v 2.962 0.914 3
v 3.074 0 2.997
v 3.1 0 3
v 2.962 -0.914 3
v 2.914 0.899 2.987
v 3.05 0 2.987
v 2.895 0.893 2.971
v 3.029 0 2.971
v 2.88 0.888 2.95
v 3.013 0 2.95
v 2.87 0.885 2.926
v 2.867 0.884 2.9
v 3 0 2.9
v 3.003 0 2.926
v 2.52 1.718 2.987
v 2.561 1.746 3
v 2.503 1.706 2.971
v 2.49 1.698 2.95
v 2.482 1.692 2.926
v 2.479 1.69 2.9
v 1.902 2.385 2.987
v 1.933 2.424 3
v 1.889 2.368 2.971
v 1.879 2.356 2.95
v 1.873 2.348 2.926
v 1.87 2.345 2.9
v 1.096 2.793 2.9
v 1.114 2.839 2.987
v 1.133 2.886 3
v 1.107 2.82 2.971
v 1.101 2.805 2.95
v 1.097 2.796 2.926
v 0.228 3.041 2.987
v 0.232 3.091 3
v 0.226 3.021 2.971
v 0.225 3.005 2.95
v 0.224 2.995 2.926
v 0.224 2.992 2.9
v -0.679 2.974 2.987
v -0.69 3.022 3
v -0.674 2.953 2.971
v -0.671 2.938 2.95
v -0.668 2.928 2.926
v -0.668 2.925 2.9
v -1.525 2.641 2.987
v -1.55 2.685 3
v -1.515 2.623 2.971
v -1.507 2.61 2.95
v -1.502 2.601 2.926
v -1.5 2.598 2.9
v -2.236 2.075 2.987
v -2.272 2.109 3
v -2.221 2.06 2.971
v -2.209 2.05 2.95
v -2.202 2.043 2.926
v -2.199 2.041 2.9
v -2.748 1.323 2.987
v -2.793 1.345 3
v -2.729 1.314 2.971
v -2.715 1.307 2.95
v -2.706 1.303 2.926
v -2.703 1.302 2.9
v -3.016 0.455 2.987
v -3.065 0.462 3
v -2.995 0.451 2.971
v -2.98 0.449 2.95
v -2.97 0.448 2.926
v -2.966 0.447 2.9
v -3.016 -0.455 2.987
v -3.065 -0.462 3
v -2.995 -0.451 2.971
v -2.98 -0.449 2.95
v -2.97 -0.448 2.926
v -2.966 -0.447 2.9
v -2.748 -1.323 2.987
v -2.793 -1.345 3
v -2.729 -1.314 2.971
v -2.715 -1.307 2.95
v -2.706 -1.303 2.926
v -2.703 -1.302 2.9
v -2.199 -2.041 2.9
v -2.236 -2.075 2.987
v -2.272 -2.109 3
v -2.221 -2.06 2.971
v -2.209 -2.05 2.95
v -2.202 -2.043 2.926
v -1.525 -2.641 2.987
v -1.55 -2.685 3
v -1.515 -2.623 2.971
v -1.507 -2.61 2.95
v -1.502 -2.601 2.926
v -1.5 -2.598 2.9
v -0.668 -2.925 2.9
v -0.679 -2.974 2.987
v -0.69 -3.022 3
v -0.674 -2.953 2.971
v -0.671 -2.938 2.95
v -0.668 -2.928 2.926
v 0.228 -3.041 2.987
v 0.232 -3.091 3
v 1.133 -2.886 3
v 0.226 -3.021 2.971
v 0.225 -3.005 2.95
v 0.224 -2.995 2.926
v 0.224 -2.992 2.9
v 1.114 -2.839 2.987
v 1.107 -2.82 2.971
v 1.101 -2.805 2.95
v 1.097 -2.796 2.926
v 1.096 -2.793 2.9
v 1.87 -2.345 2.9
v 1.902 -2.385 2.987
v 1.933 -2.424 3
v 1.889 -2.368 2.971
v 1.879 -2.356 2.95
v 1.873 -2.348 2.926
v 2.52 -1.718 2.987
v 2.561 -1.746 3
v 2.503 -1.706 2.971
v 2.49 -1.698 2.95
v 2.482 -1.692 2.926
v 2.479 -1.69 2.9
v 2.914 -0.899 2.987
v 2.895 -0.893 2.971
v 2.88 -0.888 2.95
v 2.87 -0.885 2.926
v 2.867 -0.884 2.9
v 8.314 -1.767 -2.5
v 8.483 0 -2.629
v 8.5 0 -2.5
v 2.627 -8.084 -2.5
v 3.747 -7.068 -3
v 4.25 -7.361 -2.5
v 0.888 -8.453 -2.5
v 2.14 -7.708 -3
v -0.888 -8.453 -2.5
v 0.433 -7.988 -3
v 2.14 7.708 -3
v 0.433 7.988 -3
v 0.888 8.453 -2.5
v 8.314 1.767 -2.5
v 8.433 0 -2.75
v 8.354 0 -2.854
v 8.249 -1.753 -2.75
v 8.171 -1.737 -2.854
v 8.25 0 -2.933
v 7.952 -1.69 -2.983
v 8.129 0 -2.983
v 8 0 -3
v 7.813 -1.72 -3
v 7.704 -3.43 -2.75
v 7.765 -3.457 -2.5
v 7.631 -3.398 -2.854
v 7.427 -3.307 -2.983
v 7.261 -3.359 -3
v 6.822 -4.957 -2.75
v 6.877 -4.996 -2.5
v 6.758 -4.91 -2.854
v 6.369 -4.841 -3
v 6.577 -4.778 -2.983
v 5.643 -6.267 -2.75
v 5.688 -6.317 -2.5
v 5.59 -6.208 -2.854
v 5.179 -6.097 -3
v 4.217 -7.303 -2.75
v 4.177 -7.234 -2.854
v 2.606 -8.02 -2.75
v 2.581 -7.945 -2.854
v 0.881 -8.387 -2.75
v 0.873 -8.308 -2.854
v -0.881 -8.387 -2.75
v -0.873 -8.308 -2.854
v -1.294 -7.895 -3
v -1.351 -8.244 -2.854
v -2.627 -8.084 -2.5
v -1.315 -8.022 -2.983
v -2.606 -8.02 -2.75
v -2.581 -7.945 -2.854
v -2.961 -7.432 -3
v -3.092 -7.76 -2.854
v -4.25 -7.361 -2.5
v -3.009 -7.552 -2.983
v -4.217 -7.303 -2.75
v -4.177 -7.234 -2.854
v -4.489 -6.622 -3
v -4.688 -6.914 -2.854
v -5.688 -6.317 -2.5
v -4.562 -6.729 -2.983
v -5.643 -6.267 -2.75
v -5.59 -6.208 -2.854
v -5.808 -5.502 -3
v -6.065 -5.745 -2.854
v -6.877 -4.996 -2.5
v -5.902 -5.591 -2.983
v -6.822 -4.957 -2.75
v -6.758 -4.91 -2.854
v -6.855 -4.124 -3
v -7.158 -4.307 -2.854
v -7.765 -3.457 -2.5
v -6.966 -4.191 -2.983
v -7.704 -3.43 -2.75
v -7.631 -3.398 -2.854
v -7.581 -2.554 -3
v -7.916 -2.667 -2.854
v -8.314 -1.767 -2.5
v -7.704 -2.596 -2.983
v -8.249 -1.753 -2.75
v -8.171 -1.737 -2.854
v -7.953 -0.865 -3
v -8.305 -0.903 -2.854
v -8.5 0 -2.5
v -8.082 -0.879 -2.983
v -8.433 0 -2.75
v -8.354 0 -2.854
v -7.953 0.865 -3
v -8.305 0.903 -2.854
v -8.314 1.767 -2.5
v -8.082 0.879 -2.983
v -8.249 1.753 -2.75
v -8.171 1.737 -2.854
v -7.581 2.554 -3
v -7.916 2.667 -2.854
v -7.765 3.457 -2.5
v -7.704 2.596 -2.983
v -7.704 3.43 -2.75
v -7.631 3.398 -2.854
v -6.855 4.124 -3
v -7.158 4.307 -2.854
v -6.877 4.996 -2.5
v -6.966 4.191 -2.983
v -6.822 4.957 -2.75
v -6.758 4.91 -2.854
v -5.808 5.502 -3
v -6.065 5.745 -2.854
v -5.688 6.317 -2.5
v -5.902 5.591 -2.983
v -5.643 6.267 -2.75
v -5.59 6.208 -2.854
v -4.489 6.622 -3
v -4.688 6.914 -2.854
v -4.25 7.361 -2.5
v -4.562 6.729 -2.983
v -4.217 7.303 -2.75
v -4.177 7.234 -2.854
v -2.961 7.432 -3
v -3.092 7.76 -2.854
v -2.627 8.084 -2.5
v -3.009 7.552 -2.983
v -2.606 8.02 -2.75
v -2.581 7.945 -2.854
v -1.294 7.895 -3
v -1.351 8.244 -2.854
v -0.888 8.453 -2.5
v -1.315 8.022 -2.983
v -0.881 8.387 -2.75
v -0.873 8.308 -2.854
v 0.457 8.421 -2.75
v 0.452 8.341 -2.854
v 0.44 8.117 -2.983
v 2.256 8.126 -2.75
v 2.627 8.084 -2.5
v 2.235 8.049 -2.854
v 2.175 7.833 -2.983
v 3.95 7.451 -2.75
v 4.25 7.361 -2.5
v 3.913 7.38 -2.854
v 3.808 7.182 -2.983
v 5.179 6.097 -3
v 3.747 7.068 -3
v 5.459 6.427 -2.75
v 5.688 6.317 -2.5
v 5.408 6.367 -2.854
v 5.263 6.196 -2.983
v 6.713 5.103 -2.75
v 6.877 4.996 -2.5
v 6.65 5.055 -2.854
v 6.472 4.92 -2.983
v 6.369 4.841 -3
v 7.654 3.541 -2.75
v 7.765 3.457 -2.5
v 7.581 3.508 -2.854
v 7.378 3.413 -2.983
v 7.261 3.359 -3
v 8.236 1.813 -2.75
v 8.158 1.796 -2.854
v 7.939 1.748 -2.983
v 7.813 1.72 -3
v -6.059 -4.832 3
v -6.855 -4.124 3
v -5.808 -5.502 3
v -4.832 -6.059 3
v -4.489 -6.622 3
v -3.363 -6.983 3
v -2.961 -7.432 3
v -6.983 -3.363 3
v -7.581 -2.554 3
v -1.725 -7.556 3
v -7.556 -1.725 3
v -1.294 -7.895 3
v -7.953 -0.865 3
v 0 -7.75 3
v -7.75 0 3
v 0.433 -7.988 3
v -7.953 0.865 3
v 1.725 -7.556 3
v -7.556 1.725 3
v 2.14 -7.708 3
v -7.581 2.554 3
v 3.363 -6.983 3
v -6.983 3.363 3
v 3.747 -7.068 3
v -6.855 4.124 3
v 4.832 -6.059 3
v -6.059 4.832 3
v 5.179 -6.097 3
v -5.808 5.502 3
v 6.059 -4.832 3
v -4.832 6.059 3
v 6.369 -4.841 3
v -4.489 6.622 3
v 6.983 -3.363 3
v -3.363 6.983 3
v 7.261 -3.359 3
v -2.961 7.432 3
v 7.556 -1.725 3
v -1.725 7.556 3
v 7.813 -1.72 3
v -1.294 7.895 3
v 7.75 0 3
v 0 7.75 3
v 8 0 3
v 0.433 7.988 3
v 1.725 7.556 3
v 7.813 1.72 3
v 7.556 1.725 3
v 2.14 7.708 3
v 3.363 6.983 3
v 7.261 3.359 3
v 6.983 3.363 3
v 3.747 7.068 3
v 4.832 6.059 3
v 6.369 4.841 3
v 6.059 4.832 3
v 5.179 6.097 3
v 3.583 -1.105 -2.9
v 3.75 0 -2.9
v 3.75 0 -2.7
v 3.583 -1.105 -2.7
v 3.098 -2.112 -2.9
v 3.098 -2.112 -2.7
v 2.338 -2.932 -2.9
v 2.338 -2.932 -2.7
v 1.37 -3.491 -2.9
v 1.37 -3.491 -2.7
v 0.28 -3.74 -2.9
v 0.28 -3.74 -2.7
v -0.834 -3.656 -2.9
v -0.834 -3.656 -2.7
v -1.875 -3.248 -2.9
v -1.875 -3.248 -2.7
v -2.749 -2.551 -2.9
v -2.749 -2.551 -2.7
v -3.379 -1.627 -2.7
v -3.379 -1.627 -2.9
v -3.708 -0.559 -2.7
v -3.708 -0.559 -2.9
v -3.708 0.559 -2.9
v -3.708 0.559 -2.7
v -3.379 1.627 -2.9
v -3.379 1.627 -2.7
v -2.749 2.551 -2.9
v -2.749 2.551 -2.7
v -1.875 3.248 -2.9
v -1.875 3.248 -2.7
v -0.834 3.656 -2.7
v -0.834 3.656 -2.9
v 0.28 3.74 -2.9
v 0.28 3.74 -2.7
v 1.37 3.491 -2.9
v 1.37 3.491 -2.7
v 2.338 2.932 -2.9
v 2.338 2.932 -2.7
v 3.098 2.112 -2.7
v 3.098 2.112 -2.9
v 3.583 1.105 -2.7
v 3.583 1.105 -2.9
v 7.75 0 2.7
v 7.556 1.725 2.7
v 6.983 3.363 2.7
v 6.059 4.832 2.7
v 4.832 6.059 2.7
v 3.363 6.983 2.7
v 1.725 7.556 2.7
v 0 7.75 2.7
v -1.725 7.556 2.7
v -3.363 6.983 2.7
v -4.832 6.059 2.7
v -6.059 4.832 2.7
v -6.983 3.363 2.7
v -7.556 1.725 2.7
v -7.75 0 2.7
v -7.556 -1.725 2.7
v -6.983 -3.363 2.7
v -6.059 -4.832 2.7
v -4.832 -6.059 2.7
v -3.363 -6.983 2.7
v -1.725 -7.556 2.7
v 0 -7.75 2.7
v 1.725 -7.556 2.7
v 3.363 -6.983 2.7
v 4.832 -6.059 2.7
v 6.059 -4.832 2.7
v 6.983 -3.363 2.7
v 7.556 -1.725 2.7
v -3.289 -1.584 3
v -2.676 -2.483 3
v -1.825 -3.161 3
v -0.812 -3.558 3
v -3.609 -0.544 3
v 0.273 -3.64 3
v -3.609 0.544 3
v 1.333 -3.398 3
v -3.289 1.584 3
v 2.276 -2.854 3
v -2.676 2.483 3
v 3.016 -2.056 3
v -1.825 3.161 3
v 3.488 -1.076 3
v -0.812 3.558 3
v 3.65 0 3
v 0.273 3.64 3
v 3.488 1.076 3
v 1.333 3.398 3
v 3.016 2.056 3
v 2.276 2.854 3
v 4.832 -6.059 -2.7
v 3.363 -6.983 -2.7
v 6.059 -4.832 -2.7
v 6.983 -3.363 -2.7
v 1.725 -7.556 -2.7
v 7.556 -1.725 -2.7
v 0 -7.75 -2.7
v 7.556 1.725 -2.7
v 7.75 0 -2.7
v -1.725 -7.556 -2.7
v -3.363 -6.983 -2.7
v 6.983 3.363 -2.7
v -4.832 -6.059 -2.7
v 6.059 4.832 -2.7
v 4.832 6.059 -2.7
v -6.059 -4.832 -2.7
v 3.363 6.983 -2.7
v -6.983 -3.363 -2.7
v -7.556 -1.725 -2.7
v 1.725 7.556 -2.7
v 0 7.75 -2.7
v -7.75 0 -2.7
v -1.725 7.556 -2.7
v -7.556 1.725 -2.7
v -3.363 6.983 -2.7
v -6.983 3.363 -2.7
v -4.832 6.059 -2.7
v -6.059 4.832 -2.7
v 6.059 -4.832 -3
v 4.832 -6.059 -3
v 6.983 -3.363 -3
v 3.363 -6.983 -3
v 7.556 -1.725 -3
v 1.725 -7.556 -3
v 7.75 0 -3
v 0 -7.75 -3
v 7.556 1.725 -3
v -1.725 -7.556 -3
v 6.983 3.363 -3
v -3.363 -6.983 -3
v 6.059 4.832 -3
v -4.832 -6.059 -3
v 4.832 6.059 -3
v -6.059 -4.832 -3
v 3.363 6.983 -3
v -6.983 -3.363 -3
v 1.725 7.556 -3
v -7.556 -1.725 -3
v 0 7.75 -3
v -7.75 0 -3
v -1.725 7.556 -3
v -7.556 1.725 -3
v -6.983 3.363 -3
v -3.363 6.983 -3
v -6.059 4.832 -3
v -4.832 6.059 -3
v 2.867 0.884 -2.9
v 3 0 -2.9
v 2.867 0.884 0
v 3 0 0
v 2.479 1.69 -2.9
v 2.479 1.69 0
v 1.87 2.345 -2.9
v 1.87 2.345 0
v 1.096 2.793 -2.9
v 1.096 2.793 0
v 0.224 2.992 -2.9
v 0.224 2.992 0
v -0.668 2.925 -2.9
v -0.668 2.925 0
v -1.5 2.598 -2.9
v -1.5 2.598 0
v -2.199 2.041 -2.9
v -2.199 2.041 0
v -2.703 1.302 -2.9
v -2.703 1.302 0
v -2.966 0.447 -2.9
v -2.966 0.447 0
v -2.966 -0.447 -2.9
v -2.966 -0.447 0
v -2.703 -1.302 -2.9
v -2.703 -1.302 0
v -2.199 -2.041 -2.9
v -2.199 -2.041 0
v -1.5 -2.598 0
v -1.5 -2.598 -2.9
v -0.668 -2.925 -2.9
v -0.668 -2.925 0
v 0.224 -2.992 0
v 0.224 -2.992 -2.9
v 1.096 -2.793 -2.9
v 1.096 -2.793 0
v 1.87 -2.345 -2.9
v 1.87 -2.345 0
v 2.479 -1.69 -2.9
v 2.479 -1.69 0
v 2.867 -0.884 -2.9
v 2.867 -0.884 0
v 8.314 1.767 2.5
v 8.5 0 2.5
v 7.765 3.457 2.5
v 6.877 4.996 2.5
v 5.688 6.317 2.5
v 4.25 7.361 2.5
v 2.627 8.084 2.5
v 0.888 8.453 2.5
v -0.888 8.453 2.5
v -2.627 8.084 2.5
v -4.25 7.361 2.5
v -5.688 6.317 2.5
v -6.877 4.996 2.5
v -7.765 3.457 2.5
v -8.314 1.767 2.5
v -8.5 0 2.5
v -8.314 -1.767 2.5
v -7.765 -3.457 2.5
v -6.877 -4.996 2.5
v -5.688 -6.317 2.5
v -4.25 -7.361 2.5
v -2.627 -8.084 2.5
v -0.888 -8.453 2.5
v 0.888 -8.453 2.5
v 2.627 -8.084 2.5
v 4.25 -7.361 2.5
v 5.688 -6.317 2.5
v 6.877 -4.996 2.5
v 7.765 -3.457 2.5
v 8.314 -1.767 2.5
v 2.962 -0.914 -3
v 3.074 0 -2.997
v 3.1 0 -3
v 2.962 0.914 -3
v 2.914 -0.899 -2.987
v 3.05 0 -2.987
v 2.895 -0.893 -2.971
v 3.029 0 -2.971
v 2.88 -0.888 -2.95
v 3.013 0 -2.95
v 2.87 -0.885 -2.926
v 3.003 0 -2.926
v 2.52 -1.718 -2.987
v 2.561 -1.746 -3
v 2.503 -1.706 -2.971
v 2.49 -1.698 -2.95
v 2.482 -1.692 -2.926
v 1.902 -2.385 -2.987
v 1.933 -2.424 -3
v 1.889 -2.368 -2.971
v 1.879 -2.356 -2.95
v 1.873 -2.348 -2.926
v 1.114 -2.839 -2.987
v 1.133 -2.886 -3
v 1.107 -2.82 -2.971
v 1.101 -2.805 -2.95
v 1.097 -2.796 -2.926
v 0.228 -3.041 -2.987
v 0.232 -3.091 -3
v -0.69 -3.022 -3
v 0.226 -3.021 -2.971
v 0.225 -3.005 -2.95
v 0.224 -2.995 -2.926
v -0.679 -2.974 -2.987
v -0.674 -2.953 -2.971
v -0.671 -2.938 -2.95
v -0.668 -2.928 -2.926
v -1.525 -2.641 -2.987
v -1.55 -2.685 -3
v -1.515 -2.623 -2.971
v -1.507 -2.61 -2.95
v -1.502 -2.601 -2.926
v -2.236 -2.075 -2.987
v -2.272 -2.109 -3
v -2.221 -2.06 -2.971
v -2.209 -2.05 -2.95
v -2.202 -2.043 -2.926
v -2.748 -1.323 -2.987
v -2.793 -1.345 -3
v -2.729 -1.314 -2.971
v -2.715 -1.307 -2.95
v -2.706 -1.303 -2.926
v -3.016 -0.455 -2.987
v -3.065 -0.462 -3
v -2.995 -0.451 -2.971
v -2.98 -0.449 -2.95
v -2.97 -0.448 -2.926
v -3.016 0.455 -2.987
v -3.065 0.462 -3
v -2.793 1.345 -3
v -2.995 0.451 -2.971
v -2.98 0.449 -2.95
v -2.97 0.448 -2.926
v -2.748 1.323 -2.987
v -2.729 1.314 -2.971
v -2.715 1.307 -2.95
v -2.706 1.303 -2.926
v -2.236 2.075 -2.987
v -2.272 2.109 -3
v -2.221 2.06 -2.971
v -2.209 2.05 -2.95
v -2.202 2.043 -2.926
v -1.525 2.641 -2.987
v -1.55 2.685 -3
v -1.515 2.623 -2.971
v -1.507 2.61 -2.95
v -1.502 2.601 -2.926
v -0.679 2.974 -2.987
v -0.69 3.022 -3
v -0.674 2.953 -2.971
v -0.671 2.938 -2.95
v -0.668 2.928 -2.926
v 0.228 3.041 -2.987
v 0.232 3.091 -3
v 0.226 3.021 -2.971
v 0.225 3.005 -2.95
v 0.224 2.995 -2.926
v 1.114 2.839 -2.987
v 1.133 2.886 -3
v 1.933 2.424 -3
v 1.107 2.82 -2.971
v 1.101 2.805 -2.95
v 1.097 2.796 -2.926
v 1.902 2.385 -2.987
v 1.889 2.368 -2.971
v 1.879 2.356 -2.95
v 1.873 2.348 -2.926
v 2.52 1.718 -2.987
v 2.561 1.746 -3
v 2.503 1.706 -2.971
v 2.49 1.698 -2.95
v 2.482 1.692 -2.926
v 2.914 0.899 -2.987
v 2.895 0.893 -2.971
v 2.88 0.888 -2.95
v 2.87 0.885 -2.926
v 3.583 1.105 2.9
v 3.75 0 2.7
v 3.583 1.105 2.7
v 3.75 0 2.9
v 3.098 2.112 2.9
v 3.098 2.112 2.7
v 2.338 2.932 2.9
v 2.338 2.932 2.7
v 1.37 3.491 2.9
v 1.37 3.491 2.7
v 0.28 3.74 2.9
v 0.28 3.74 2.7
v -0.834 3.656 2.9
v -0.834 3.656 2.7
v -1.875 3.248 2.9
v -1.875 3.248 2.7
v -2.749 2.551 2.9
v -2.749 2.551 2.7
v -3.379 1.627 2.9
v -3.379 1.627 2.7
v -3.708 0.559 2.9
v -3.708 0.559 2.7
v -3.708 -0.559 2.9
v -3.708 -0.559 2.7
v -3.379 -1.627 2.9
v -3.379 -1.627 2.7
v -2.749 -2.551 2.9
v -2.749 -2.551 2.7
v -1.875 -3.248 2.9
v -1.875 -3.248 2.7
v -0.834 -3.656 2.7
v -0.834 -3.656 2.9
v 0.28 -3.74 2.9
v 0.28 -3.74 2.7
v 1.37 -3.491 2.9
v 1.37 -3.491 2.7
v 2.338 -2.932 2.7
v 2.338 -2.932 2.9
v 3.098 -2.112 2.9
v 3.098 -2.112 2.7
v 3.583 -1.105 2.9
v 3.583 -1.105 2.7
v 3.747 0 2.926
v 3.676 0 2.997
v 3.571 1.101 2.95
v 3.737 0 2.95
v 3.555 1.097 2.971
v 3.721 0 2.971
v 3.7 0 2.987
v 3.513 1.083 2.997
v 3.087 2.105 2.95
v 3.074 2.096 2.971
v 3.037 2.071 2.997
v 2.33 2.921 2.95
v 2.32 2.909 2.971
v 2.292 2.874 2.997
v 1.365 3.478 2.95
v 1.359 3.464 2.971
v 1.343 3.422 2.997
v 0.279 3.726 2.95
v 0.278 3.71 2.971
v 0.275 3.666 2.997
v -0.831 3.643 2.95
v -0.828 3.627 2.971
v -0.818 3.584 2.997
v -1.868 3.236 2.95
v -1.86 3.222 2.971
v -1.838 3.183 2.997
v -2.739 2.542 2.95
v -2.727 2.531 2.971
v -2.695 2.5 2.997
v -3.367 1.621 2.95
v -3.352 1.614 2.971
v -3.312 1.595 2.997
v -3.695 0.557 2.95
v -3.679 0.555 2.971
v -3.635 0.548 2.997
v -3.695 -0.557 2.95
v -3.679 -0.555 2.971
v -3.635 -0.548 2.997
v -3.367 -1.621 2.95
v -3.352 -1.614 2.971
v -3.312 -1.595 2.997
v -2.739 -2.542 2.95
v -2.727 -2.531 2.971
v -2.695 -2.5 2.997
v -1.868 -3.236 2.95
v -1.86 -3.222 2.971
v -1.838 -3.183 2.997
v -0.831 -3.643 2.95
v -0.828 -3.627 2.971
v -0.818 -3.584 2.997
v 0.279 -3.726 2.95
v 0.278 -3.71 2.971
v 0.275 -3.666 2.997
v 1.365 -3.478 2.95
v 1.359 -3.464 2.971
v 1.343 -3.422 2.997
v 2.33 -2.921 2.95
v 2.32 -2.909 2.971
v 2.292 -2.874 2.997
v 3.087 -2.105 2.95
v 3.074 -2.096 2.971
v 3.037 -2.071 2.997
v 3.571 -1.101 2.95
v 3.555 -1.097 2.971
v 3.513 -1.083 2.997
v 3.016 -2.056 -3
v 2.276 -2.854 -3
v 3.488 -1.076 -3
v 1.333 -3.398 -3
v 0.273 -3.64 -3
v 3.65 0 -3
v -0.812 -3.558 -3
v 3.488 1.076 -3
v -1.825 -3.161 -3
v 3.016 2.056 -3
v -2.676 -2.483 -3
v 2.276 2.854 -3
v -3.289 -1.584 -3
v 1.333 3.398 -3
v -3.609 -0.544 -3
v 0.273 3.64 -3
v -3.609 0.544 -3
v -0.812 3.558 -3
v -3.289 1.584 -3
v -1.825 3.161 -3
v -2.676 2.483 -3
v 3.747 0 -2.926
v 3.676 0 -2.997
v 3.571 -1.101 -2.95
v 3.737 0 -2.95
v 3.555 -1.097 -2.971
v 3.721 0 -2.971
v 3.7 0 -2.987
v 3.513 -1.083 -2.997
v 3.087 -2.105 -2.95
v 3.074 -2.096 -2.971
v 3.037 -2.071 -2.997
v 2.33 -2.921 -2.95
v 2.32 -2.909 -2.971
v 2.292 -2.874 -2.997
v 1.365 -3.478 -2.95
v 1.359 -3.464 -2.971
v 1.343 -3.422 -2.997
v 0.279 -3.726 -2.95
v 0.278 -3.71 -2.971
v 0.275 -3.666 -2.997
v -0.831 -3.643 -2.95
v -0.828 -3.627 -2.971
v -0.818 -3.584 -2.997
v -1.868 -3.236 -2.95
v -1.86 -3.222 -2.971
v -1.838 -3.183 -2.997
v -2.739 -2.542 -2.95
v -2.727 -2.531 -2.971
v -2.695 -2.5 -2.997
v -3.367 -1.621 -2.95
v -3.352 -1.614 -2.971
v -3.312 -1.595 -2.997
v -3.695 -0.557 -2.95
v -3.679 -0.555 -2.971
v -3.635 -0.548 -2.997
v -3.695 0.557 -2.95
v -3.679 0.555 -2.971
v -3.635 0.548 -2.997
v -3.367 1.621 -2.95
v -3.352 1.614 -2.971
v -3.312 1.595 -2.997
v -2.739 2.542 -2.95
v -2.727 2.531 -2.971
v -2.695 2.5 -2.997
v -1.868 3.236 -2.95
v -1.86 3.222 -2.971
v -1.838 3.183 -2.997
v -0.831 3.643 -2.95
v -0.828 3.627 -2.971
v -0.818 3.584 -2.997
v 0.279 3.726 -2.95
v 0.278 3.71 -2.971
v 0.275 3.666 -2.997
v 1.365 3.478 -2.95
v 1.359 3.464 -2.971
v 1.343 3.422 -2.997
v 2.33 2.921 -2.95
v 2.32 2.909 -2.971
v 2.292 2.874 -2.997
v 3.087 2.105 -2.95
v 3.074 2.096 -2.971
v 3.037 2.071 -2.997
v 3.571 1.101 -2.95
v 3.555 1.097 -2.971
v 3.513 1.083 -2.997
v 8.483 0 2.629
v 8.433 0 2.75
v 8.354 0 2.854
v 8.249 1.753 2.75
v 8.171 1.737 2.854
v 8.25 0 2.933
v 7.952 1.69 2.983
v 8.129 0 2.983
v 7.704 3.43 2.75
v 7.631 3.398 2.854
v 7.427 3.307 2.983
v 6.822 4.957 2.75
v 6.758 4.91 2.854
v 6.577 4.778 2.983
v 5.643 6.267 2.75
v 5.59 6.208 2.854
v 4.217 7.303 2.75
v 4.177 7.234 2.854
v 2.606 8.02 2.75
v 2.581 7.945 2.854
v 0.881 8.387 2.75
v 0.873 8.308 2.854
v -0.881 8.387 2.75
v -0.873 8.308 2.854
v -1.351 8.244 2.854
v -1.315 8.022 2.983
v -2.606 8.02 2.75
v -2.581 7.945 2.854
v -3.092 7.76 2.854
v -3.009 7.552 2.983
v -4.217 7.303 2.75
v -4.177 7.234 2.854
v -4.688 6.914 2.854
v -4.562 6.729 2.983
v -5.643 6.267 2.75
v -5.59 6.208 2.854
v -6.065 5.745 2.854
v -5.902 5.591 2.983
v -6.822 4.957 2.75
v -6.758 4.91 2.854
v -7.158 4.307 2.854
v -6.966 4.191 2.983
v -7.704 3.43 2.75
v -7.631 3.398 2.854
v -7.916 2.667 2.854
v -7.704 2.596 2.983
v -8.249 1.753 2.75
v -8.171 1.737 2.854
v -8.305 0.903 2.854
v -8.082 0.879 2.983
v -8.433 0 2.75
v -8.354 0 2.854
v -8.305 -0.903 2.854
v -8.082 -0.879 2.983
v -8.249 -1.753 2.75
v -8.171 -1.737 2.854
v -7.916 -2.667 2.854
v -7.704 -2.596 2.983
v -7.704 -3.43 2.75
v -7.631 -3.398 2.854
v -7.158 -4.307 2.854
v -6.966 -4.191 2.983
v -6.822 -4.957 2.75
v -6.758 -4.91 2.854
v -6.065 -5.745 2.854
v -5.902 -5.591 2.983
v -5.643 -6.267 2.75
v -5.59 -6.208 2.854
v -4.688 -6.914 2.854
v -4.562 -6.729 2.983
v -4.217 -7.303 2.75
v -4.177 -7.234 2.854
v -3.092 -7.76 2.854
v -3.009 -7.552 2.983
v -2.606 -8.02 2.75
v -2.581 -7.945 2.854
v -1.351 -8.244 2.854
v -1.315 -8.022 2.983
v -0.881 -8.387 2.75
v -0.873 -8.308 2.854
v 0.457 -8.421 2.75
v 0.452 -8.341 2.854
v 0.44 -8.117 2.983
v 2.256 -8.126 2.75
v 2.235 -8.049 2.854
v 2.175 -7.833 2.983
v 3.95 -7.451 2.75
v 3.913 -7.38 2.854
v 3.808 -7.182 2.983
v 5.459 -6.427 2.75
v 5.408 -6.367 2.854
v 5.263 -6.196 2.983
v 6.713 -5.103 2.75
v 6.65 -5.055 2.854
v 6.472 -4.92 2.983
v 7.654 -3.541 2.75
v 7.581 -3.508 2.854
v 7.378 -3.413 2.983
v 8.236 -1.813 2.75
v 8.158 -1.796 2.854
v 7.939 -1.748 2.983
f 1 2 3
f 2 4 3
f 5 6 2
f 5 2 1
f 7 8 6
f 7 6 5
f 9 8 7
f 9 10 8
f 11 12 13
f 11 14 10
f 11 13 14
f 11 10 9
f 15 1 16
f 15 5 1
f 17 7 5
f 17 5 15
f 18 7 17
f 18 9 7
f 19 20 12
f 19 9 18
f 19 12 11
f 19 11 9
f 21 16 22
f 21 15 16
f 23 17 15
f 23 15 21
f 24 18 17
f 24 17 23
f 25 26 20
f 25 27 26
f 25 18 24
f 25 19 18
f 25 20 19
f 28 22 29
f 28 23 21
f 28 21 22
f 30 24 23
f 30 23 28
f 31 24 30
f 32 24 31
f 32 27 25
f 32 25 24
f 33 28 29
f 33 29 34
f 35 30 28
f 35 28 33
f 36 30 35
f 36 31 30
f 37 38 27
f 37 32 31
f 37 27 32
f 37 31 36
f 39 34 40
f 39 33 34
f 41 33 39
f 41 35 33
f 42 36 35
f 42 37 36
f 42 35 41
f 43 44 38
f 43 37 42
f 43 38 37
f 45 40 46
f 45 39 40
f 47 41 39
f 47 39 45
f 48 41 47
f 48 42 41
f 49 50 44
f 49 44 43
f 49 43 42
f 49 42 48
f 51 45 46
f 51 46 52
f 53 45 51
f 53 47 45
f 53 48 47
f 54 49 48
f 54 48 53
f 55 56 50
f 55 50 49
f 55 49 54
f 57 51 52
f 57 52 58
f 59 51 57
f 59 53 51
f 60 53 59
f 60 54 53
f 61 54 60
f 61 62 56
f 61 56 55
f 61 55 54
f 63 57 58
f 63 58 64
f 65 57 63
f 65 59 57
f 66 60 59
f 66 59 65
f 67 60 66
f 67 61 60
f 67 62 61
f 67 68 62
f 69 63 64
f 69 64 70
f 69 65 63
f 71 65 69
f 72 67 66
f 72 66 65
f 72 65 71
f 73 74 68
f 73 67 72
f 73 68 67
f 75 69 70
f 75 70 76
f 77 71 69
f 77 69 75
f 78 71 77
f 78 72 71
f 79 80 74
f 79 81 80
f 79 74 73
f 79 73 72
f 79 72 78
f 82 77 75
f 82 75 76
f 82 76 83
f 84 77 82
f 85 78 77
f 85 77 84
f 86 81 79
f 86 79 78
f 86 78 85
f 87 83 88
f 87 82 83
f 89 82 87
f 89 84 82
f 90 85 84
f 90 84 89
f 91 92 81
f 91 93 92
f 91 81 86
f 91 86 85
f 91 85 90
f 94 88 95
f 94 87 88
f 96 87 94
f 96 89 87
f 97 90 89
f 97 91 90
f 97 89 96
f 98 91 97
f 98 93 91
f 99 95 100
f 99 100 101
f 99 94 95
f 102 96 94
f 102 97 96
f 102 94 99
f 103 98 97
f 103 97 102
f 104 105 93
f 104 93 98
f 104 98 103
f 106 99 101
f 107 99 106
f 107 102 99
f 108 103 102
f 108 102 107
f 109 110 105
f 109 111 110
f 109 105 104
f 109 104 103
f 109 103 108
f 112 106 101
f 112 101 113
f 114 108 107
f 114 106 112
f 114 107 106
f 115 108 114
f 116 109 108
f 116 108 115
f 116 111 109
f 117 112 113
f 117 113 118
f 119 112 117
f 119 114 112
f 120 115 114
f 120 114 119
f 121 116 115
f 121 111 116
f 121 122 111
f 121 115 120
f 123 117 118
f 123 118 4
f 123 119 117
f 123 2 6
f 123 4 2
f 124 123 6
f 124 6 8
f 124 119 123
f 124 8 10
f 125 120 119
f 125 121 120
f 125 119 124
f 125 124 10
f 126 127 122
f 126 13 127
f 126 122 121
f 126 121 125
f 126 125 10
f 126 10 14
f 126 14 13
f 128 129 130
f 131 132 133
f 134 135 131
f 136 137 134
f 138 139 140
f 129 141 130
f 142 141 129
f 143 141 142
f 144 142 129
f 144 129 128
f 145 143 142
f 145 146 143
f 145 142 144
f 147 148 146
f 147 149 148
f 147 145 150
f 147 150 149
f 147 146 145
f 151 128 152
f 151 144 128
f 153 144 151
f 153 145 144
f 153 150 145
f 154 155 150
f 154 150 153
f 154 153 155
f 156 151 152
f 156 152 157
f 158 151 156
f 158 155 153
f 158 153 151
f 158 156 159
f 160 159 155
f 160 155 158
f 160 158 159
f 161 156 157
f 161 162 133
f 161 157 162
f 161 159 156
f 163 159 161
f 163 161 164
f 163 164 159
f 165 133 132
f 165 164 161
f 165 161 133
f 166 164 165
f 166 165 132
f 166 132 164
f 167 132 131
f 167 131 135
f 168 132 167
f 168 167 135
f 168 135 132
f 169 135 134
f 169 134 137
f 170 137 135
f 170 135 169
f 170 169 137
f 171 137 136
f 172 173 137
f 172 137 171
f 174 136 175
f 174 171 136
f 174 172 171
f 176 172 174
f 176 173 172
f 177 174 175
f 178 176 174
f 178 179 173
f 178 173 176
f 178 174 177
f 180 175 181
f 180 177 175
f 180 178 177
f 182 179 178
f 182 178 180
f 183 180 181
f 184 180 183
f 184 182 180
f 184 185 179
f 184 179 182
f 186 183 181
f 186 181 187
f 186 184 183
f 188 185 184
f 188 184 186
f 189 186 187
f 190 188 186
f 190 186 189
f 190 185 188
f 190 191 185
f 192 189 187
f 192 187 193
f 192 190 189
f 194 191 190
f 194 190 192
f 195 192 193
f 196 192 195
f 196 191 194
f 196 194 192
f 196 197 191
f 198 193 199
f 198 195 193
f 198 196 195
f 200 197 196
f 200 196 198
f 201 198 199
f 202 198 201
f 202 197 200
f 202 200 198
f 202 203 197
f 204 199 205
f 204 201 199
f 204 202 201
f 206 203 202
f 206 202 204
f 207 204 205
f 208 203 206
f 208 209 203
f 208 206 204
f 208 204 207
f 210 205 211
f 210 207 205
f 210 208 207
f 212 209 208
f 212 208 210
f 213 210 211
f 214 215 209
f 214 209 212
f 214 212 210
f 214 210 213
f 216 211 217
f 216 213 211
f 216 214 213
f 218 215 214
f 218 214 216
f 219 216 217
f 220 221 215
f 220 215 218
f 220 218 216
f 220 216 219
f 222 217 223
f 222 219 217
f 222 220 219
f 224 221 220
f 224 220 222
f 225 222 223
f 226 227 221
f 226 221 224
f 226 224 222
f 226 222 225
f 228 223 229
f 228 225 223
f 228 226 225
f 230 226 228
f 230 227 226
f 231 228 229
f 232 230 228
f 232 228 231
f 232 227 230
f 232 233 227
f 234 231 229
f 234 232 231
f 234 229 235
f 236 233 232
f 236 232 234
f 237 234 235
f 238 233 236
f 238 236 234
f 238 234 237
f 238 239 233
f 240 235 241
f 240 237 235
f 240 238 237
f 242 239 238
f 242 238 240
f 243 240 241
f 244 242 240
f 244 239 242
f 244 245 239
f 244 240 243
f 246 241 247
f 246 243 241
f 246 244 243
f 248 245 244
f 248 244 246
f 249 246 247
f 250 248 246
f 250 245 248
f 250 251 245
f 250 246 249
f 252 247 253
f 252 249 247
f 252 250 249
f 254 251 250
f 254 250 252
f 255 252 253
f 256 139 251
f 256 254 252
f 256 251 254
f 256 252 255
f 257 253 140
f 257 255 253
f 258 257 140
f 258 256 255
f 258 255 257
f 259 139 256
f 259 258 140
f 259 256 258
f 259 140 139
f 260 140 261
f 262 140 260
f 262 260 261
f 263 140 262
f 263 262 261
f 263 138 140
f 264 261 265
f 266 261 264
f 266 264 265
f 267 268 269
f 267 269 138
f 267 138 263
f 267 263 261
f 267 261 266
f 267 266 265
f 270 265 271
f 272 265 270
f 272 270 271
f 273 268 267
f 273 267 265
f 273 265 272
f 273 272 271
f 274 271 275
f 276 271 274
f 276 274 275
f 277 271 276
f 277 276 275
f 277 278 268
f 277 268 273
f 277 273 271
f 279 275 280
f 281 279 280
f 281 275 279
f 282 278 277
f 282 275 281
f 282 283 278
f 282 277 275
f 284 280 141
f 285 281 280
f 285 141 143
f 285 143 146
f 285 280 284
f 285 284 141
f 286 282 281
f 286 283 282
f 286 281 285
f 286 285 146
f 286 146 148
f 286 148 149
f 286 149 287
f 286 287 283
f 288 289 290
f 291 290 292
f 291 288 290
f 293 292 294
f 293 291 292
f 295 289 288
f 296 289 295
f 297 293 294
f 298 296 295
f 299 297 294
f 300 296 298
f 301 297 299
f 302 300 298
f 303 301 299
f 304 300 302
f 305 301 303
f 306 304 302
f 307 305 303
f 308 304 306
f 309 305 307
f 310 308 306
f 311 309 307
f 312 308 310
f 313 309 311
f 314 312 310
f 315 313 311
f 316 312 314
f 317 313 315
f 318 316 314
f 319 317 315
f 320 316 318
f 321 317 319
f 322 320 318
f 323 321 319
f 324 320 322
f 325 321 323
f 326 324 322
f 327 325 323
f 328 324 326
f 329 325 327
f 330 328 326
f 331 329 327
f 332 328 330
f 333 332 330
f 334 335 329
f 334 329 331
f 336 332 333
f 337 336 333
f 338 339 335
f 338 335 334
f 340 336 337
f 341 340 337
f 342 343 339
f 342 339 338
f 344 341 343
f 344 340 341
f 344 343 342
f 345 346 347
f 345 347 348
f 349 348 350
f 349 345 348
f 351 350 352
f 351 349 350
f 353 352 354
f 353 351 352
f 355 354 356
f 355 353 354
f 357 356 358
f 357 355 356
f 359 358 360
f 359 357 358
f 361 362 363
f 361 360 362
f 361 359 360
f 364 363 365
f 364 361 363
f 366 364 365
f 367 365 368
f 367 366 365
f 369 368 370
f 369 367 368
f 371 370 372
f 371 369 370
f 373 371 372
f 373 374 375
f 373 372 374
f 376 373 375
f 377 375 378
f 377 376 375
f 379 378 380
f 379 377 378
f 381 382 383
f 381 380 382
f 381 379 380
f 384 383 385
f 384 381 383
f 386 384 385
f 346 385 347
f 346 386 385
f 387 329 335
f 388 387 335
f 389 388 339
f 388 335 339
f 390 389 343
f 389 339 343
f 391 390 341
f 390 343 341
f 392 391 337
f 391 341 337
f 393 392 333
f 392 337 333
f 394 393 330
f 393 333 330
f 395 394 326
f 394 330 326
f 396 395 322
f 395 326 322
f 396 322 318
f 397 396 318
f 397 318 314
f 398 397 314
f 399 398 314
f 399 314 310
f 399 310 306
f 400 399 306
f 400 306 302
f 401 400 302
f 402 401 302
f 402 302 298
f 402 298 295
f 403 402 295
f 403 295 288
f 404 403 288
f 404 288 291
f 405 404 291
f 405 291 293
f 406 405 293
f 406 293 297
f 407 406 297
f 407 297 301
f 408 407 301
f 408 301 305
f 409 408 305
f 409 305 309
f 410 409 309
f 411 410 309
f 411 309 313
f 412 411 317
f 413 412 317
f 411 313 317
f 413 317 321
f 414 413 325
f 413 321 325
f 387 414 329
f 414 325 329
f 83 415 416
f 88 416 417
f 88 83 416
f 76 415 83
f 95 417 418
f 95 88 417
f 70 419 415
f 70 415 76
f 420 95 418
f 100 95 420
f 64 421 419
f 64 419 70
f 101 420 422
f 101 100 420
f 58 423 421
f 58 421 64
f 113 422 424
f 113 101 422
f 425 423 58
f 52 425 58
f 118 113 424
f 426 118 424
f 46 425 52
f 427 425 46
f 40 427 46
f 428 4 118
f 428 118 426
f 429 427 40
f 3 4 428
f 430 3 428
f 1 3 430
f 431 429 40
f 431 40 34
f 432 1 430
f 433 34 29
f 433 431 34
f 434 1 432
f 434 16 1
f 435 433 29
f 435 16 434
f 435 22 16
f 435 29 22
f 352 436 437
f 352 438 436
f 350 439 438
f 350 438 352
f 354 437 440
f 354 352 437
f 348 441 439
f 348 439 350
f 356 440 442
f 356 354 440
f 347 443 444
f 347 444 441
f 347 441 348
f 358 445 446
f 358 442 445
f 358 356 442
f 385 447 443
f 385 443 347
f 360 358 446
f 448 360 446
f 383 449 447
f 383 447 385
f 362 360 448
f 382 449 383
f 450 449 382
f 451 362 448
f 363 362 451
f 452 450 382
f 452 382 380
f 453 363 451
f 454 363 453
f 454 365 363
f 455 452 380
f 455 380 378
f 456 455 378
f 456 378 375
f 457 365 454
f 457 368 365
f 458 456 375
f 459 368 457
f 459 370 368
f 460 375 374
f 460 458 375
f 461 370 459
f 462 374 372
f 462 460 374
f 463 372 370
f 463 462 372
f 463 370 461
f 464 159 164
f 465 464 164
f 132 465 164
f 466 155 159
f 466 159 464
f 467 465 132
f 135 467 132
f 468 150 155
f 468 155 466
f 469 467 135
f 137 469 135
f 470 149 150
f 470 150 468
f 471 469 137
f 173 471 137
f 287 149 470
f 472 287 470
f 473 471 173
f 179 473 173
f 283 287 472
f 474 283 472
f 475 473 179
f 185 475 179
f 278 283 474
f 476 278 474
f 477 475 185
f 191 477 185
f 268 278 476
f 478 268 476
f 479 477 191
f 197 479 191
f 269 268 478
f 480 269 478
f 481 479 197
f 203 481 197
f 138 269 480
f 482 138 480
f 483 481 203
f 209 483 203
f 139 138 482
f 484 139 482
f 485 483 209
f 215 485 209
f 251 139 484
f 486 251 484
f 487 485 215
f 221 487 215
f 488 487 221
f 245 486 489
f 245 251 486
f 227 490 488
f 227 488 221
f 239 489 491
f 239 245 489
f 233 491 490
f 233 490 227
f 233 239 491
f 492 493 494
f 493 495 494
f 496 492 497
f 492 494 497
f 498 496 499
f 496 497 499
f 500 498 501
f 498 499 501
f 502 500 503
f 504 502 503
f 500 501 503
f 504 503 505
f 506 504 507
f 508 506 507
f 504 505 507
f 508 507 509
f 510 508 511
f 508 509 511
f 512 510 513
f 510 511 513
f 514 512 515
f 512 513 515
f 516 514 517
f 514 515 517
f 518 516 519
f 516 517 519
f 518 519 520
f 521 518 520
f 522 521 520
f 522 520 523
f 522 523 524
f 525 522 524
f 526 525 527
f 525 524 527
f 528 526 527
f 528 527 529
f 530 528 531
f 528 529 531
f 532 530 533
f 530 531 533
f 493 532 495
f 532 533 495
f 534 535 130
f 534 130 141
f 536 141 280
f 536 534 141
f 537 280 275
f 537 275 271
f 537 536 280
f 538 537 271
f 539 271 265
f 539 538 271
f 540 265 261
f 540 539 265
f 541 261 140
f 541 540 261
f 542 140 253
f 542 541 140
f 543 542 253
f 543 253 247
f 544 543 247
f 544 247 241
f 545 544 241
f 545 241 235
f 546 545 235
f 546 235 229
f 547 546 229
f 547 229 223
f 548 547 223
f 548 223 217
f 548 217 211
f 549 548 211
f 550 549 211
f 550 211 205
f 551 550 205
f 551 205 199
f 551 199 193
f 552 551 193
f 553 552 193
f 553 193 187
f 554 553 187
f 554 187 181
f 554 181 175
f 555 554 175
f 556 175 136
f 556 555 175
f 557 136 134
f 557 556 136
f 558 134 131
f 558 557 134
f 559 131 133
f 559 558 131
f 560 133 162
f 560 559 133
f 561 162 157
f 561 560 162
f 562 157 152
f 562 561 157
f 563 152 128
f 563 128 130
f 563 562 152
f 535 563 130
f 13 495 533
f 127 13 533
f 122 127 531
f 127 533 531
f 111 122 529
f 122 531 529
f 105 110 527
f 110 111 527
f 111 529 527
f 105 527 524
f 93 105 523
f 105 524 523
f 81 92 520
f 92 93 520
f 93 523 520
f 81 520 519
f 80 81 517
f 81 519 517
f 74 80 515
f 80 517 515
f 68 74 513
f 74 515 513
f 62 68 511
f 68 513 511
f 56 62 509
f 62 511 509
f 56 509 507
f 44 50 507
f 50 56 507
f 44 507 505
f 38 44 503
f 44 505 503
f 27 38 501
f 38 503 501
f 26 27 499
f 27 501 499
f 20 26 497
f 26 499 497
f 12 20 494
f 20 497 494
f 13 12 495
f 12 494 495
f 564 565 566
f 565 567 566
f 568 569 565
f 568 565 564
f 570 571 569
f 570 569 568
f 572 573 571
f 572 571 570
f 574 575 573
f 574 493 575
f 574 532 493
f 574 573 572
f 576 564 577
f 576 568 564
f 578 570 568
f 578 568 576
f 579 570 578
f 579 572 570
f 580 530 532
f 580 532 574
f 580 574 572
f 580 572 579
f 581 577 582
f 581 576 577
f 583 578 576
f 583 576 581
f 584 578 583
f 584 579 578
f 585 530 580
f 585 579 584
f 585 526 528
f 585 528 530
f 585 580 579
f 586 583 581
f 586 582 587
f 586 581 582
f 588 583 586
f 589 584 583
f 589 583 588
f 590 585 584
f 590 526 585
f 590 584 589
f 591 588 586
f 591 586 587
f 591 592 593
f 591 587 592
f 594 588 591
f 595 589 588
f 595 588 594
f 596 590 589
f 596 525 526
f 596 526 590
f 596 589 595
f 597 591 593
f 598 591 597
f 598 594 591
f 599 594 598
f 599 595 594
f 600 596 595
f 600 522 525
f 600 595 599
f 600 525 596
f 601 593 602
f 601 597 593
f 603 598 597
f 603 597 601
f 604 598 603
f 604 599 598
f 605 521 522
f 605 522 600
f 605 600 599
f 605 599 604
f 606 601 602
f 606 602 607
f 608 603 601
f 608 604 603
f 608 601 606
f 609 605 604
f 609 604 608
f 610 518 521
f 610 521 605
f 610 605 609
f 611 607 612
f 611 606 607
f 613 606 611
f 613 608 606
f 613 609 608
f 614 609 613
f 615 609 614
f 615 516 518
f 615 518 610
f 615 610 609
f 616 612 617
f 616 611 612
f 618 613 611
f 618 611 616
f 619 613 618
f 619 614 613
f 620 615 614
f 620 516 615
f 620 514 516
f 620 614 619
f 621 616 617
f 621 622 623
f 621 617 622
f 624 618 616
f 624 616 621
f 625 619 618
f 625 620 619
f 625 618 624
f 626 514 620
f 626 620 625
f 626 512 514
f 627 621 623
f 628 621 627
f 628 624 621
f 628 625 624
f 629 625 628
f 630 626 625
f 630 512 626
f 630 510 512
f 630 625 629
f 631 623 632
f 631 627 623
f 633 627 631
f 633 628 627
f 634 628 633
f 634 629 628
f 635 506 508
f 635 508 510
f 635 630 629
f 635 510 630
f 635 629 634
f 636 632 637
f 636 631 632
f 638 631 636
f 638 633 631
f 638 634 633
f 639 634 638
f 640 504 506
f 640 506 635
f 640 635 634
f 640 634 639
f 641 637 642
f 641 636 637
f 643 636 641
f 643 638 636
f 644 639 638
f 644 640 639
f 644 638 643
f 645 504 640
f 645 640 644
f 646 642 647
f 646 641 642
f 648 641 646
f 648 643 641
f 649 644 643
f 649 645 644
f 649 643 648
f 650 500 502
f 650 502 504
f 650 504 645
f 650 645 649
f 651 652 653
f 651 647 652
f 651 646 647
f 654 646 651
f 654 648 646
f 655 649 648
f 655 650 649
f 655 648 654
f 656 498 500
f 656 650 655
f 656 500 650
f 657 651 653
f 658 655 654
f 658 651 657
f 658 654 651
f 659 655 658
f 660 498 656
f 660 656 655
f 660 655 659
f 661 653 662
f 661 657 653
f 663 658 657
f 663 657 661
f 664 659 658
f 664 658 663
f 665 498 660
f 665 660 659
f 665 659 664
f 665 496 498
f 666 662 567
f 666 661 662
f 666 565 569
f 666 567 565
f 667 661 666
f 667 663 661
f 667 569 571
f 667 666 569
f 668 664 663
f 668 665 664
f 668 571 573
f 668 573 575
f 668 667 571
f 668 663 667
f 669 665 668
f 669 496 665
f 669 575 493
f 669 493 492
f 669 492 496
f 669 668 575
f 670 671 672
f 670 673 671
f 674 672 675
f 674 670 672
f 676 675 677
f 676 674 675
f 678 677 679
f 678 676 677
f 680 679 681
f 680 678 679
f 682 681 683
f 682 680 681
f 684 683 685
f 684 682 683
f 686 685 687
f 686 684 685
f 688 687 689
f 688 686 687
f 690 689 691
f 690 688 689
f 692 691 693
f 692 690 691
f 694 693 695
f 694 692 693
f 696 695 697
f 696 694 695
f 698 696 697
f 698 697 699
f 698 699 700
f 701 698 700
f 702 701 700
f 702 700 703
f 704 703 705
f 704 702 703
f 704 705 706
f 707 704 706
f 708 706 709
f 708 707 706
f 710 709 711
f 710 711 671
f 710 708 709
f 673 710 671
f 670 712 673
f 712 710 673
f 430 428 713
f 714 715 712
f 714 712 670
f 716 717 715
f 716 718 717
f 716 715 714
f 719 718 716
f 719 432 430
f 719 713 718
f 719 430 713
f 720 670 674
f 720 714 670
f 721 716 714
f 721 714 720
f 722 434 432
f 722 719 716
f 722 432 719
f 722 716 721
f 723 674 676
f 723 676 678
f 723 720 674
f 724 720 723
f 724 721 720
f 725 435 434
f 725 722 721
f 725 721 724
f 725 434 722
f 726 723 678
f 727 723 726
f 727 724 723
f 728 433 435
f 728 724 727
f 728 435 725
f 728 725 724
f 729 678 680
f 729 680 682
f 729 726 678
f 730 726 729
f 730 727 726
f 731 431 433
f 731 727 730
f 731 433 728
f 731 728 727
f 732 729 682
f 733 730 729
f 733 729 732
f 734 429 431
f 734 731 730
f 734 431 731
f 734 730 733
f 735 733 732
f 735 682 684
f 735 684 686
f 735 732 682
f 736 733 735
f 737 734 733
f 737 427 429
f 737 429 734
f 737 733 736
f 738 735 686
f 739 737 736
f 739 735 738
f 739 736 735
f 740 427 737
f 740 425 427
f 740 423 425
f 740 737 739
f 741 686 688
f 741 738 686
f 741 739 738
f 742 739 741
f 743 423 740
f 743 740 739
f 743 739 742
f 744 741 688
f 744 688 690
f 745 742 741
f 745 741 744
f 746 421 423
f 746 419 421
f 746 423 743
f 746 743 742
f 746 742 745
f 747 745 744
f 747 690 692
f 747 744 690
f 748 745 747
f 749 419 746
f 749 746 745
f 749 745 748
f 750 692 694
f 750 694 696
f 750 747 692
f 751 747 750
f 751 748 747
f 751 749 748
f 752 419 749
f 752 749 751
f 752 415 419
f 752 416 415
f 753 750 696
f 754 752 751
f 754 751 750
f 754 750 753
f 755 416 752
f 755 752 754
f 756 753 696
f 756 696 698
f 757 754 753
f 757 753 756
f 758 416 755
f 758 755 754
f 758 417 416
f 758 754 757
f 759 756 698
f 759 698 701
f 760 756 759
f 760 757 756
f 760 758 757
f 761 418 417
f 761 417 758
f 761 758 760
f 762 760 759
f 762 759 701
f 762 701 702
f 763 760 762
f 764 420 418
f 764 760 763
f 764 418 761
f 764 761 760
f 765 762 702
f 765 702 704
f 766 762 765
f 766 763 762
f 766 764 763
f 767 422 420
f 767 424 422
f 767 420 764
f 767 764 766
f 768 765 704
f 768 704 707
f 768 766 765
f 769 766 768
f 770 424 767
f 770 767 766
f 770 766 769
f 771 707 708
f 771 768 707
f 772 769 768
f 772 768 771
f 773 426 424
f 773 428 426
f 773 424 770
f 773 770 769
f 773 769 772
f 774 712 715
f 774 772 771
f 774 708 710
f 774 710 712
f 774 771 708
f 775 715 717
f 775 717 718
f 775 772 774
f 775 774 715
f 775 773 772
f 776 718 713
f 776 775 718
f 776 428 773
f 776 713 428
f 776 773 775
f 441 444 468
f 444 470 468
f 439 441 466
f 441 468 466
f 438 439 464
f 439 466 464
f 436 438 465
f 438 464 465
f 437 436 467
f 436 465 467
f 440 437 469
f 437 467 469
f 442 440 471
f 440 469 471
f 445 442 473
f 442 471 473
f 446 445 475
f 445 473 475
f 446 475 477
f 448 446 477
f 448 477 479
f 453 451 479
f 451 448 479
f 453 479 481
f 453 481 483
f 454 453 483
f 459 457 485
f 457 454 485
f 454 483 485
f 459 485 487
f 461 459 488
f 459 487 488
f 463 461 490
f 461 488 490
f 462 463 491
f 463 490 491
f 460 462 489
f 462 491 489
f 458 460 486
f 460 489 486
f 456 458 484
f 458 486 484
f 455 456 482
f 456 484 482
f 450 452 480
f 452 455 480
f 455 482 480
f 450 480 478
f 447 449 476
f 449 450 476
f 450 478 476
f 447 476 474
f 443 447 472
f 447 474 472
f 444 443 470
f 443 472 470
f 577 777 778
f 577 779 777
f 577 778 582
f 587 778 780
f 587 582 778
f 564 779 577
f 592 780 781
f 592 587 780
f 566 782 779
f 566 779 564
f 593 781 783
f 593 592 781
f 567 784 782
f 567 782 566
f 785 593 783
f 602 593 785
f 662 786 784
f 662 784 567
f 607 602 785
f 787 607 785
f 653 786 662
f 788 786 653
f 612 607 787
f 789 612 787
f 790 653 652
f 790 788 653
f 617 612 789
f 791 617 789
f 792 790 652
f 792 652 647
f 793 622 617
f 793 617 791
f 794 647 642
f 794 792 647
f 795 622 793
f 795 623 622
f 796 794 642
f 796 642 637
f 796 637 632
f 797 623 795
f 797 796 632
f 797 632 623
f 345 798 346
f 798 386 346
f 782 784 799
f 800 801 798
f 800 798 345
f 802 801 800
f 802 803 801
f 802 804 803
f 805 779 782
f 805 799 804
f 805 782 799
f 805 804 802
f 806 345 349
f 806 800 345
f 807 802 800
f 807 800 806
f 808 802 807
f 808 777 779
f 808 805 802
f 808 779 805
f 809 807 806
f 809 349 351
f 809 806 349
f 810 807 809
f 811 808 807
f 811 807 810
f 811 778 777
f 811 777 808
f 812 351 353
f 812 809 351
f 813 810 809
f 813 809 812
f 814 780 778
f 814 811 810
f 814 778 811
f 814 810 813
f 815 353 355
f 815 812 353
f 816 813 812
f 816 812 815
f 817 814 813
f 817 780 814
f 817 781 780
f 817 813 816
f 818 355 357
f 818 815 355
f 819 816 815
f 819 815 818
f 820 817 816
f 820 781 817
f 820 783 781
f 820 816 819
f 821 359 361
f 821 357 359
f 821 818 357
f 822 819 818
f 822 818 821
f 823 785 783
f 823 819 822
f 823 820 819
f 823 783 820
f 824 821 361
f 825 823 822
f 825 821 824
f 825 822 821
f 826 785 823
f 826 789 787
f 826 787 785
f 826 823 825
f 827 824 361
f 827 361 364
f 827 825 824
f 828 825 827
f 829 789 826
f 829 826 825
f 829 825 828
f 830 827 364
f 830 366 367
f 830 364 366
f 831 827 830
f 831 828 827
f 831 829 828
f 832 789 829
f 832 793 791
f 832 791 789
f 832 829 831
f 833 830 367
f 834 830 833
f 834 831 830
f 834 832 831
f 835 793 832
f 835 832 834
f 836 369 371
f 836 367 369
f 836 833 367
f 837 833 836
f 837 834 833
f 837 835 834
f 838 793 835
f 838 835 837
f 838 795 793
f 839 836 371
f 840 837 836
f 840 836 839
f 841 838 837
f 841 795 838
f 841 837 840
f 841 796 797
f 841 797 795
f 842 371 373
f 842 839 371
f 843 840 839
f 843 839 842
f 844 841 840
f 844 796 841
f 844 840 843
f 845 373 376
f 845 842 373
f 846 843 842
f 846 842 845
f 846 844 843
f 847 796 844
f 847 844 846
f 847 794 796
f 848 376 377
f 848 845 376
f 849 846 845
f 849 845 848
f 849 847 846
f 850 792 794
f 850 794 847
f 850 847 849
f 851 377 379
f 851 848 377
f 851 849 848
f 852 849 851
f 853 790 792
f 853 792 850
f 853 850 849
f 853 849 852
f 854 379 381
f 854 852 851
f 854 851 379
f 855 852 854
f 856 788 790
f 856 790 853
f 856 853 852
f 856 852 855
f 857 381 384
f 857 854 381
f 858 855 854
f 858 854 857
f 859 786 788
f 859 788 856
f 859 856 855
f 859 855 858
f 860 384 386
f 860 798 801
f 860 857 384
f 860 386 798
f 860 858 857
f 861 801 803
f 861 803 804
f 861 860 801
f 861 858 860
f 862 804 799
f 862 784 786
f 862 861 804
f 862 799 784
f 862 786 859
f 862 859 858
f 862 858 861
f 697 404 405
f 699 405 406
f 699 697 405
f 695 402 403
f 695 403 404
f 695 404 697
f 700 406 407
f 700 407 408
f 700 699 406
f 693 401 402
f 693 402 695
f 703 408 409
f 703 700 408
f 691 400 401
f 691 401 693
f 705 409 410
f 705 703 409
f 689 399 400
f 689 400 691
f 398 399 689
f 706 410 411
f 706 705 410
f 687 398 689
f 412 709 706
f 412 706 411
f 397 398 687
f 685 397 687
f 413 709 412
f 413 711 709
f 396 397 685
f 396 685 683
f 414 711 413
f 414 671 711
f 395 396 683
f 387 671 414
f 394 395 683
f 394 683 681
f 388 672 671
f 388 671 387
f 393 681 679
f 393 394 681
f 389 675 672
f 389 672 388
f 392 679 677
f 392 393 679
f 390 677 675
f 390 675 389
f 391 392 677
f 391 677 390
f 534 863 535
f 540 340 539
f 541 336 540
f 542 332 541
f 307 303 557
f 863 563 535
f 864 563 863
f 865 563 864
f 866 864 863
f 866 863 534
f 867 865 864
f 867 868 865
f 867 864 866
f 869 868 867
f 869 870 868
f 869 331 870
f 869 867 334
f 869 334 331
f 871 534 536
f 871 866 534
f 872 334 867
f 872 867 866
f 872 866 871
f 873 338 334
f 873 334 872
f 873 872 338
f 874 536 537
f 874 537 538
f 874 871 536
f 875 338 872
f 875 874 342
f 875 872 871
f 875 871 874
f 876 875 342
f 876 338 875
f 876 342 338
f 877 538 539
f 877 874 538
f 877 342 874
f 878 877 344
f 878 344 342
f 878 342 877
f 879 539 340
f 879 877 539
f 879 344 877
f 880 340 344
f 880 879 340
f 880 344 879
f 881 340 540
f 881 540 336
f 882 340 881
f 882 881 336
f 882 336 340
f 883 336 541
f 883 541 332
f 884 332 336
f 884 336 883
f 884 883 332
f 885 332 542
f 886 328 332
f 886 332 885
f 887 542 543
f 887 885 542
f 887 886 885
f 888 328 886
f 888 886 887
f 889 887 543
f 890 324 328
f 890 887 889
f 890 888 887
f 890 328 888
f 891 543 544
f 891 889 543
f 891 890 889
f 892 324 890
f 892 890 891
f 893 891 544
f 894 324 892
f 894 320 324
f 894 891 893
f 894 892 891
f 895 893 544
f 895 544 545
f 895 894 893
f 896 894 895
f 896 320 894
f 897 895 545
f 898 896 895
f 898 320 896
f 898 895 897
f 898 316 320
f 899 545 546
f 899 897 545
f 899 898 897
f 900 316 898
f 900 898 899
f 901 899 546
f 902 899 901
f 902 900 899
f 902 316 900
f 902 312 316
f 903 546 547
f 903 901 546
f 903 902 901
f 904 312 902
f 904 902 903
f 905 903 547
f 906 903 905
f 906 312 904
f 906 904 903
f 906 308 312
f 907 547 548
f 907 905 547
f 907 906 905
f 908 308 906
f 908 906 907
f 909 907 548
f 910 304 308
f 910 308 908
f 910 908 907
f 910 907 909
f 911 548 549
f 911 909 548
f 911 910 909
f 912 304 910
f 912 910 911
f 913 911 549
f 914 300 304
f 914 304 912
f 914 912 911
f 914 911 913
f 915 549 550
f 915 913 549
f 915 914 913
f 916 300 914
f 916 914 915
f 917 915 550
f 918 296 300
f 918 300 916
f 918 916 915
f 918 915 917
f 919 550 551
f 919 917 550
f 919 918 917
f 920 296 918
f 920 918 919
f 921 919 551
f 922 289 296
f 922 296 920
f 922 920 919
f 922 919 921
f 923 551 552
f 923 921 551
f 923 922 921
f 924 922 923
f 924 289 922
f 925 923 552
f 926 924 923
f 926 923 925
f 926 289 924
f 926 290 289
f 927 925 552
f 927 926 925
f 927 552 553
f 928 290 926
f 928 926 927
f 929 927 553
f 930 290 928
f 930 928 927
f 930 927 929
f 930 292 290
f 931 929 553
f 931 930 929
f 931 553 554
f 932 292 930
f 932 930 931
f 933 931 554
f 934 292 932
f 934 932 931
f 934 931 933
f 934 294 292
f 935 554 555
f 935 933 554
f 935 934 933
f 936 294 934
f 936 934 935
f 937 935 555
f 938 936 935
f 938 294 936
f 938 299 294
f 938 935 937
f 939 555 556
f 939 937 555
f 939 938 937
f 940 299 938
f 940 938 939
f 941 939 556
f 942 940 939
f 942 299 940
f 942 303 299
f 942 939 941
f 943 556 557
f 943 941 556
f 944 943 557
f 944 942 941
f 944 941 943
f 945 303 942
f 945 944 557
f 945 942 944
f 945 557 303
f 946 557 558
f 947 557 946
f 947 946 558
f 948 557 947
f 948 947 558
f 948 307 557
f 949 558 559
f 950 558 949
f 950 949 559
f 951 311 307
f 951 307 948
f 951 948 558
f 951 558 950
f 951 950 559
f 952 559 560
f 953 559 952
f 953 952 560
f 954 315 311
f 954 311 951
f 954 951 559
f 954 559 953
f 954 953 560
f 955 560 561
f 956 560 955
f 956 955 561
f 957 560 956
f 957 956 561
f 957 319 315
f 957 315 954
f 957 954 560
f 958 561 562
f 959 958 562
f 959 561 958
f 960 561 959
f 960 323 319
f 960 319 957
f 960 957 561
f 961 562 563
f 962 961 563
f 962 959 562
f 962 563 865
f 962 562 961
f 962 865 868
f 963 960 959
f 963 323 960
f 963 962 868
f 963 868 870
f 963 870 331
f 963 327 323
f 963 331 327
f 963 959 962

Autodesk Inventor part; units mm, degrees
ref_plane "YZ Plane" through (0, 0, 0) normal (1, 0, 0) x (0, 1, 0)
ref_plane "XZ Plane" through (0, 0, 0) normal (0, 1, 0) x (-1, 0, 0)
ref_plane "XY Plane" through (0, 0, 0) normal (0, 0, 1) x (1, 0, 0)
sketch "スケッチ1" plane through (0, 0, 0) normal (0, 0, 1) x (1, 0, 0)
  circle A0 centre (0, 0) radius 8.5
  circle A1 centre (0, 0) radius 3
  dimension "d0" = 17
  dimension "d1" = 6
extrude "押し出し1" add sketch "スケッチ1" along normal blind 3
sketch "スケッチ2" plane through (0, 0, 3) normal (0, 0, 1) x (1, 0, 0)
  circle A0 centre (0, 0) radius 7.75
  circle A1 centre (0, 0) radius 3.75
  circle A2 centre (0, 0) radius 8.5 projected
  circle A3 centre (0, 0) radius 3 projected
  dimension "d4" = 0.75
  dimension "d5" = 0.75
extrude "押し出し2" cut sketch "スケッチ2" against normal blind 0.3 contours A0
mirror "ミラー1" about plane through (0, 0, 0) normal (0, 0, -1) of "押し出し1", "押し出し2"
fillet "フィレット1" radius 0.5 2 edges at (-8.5, 0, -3) (-8.5, 0, 3)
fillet "フィレット2" radius 0.1 4 edges at (-3, 0, -3) (-3, 0, 3) (-3.75, 0, -3) (-3.75, 0, 3)
properties part number "Bearing_small"
